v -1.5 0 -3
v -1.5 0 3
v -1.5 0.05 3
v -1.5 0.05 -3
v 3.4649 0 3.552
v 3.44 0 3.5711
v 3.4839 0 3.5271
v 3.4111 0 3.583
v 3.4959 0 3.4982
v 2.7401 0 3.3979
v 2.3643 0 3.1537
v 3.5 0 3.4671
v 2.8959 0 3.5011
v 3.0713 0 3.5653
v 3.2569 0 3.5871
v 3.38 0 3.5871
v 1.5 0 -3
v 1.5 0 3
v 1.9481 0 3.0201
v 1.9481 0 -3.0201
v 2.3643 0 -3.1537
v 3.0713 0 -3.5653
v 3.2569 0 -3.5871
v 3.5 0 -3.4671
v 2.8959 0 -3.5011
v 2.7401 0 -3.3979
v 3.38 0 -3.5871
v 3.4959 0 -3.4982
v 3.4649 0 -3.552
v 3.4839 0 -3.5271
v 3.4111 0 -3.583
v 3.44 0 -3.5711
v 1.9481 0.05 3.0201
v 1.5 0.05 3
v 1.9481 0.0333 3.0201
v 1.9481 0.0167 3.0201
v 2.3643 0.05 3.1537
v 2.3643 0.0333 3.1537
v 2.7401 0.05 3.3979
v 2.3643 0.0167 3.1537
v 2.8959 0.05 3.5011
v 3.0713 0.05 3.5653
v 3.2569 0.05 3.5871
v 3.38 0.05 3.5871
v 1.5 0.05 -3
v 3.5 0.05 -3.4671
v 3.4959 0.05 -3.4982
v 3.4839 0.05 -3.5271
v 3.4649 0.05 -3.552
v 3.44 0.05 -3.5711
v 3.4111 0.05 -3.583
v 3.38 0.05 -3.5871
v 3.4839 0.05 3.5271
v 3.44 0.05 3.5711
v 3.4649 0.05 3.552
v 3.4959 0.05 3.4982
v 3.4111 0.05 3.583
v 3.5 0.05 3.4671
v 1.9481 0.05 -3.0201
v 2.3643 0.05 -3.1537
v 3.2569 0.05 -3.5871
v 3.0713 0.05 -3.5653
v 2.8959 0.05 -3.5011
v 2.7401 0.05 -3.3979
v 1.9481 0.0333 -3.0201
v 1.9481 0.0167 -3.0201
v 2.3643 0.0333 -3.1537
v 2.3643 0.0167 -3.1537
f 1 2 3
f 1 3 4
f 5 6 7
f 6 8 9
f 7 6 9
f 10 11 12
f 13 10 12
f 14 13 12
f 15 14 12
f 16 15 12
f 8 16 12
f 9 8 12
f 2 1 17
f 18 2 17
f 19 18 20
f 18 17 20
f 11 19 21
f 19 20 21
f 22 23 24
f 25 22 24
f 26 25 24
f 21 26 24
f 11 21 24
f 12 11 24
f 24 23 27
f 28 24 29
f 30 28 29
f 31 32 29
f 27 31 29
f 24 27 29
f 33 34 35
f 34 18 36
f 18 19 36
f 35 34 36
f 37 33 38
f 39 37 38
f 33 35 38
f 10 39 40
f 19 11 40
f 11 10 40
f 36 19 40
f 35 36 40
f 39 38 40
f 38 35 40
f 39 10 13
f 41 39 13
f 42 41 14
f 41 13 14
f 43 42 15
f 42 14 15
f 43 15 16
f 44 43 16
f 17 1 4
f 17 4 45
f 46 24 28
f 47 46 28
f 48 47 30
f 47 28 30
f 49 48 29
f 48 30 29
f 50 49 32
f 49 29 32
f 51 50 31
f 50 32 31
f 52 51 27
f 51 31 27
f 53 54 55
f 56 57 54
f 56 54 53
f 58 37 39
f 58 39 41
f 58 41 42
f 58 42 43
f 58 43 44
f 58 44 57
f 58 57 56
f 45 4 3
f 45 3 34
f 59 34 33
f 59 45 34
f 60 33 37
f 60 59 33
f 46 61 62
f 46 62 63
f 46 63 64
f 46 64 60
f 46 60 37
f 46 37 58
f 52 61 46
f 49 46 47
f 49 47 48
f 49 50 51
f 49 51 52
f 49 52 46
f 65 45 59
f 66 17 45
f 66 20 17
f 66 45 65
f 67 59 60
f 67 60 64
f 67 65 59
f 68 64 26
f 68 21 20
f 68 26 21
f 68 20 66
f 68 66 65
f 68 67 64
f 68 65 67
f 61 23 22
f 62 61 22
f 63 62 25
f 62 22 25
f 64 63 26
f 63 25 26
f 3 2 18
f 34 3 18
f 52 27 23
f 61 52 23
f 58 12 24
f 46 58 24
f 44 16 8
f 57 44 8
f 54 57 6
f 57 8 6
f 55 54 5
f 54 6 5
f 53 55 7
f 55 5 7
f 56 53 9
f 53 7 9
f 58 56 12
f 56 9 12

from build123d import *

# Parameters (mm, degrees)
SKETCH_1_W      = 3
SKETCH_1_H      = 6
EXTRUDE_1_DEPTH = 0.05


with BuildPart() as part:
    # 草图1 → 凸台-拉伸1 (new body)
    with BuildSketch(Plane(origin=(0, 0, 0), x_dir=(1, 0, 0), z_dir=(0, 1, 0))):
        Rectangle(SKETCH_1_W, SKETCH_1_H)
        with BuildLine():
            Line((3.5, 0.013586668), (3.5, 3.467136252))
            ThreePointArc((3.5, 3.467136252), (3.464852814, 3.551989066), (3.38, 3.587136252))
            Line((3.38, 3.587136252), (3.256879504, 3.587136252))
            ThreePointArc((3.256879504, 3.587136252), (2.981721672, 3.538327418), (2.740139172, 3.397856671))
            add(Edge.make_bspline(
                [(1.5, 3), (1.961202326, 2.96255509), (2.387230581, 3.099255057), (2.740139172, 3.397856671)],
                knots=[0, 0, 0, 0, 0.839620689, 0.839620689, 0.839620689, 0.839620689], degree=3))
            Line((1.5, 3), (1.5, -3))
            add(Edge.make_bspline(
                [(1.5, -3), (1.961202326, -2.96255509), (2.387230581, -3.099255057), (2.740139172, -3.397856671)],
                knots=[0, 0, 0, 0, 0.839620689, 0.839620689, 0.839620689, 0.839620689], degree=3))
            ThreePointArc((2.740139172, -3.397856671), (2.981721672, -3.538327418), (3.256879504, -3.587136252))
            Line((3.256879504, -3.587136252), (3.38, -3.587136252))
            ThreePointArc((3.38, -3.587136252), (3.464852814, -3.551989066), (3.5, -3.467136252))
            Line((3.5, -3.467136252), (3.5, -0.013586668))
            Line((3.5, -0.013586668), (3.5, 0.013586668))
        make_face()
    extrude(amount=EXTRUDE_1_DEPTH)


solid = part.part
